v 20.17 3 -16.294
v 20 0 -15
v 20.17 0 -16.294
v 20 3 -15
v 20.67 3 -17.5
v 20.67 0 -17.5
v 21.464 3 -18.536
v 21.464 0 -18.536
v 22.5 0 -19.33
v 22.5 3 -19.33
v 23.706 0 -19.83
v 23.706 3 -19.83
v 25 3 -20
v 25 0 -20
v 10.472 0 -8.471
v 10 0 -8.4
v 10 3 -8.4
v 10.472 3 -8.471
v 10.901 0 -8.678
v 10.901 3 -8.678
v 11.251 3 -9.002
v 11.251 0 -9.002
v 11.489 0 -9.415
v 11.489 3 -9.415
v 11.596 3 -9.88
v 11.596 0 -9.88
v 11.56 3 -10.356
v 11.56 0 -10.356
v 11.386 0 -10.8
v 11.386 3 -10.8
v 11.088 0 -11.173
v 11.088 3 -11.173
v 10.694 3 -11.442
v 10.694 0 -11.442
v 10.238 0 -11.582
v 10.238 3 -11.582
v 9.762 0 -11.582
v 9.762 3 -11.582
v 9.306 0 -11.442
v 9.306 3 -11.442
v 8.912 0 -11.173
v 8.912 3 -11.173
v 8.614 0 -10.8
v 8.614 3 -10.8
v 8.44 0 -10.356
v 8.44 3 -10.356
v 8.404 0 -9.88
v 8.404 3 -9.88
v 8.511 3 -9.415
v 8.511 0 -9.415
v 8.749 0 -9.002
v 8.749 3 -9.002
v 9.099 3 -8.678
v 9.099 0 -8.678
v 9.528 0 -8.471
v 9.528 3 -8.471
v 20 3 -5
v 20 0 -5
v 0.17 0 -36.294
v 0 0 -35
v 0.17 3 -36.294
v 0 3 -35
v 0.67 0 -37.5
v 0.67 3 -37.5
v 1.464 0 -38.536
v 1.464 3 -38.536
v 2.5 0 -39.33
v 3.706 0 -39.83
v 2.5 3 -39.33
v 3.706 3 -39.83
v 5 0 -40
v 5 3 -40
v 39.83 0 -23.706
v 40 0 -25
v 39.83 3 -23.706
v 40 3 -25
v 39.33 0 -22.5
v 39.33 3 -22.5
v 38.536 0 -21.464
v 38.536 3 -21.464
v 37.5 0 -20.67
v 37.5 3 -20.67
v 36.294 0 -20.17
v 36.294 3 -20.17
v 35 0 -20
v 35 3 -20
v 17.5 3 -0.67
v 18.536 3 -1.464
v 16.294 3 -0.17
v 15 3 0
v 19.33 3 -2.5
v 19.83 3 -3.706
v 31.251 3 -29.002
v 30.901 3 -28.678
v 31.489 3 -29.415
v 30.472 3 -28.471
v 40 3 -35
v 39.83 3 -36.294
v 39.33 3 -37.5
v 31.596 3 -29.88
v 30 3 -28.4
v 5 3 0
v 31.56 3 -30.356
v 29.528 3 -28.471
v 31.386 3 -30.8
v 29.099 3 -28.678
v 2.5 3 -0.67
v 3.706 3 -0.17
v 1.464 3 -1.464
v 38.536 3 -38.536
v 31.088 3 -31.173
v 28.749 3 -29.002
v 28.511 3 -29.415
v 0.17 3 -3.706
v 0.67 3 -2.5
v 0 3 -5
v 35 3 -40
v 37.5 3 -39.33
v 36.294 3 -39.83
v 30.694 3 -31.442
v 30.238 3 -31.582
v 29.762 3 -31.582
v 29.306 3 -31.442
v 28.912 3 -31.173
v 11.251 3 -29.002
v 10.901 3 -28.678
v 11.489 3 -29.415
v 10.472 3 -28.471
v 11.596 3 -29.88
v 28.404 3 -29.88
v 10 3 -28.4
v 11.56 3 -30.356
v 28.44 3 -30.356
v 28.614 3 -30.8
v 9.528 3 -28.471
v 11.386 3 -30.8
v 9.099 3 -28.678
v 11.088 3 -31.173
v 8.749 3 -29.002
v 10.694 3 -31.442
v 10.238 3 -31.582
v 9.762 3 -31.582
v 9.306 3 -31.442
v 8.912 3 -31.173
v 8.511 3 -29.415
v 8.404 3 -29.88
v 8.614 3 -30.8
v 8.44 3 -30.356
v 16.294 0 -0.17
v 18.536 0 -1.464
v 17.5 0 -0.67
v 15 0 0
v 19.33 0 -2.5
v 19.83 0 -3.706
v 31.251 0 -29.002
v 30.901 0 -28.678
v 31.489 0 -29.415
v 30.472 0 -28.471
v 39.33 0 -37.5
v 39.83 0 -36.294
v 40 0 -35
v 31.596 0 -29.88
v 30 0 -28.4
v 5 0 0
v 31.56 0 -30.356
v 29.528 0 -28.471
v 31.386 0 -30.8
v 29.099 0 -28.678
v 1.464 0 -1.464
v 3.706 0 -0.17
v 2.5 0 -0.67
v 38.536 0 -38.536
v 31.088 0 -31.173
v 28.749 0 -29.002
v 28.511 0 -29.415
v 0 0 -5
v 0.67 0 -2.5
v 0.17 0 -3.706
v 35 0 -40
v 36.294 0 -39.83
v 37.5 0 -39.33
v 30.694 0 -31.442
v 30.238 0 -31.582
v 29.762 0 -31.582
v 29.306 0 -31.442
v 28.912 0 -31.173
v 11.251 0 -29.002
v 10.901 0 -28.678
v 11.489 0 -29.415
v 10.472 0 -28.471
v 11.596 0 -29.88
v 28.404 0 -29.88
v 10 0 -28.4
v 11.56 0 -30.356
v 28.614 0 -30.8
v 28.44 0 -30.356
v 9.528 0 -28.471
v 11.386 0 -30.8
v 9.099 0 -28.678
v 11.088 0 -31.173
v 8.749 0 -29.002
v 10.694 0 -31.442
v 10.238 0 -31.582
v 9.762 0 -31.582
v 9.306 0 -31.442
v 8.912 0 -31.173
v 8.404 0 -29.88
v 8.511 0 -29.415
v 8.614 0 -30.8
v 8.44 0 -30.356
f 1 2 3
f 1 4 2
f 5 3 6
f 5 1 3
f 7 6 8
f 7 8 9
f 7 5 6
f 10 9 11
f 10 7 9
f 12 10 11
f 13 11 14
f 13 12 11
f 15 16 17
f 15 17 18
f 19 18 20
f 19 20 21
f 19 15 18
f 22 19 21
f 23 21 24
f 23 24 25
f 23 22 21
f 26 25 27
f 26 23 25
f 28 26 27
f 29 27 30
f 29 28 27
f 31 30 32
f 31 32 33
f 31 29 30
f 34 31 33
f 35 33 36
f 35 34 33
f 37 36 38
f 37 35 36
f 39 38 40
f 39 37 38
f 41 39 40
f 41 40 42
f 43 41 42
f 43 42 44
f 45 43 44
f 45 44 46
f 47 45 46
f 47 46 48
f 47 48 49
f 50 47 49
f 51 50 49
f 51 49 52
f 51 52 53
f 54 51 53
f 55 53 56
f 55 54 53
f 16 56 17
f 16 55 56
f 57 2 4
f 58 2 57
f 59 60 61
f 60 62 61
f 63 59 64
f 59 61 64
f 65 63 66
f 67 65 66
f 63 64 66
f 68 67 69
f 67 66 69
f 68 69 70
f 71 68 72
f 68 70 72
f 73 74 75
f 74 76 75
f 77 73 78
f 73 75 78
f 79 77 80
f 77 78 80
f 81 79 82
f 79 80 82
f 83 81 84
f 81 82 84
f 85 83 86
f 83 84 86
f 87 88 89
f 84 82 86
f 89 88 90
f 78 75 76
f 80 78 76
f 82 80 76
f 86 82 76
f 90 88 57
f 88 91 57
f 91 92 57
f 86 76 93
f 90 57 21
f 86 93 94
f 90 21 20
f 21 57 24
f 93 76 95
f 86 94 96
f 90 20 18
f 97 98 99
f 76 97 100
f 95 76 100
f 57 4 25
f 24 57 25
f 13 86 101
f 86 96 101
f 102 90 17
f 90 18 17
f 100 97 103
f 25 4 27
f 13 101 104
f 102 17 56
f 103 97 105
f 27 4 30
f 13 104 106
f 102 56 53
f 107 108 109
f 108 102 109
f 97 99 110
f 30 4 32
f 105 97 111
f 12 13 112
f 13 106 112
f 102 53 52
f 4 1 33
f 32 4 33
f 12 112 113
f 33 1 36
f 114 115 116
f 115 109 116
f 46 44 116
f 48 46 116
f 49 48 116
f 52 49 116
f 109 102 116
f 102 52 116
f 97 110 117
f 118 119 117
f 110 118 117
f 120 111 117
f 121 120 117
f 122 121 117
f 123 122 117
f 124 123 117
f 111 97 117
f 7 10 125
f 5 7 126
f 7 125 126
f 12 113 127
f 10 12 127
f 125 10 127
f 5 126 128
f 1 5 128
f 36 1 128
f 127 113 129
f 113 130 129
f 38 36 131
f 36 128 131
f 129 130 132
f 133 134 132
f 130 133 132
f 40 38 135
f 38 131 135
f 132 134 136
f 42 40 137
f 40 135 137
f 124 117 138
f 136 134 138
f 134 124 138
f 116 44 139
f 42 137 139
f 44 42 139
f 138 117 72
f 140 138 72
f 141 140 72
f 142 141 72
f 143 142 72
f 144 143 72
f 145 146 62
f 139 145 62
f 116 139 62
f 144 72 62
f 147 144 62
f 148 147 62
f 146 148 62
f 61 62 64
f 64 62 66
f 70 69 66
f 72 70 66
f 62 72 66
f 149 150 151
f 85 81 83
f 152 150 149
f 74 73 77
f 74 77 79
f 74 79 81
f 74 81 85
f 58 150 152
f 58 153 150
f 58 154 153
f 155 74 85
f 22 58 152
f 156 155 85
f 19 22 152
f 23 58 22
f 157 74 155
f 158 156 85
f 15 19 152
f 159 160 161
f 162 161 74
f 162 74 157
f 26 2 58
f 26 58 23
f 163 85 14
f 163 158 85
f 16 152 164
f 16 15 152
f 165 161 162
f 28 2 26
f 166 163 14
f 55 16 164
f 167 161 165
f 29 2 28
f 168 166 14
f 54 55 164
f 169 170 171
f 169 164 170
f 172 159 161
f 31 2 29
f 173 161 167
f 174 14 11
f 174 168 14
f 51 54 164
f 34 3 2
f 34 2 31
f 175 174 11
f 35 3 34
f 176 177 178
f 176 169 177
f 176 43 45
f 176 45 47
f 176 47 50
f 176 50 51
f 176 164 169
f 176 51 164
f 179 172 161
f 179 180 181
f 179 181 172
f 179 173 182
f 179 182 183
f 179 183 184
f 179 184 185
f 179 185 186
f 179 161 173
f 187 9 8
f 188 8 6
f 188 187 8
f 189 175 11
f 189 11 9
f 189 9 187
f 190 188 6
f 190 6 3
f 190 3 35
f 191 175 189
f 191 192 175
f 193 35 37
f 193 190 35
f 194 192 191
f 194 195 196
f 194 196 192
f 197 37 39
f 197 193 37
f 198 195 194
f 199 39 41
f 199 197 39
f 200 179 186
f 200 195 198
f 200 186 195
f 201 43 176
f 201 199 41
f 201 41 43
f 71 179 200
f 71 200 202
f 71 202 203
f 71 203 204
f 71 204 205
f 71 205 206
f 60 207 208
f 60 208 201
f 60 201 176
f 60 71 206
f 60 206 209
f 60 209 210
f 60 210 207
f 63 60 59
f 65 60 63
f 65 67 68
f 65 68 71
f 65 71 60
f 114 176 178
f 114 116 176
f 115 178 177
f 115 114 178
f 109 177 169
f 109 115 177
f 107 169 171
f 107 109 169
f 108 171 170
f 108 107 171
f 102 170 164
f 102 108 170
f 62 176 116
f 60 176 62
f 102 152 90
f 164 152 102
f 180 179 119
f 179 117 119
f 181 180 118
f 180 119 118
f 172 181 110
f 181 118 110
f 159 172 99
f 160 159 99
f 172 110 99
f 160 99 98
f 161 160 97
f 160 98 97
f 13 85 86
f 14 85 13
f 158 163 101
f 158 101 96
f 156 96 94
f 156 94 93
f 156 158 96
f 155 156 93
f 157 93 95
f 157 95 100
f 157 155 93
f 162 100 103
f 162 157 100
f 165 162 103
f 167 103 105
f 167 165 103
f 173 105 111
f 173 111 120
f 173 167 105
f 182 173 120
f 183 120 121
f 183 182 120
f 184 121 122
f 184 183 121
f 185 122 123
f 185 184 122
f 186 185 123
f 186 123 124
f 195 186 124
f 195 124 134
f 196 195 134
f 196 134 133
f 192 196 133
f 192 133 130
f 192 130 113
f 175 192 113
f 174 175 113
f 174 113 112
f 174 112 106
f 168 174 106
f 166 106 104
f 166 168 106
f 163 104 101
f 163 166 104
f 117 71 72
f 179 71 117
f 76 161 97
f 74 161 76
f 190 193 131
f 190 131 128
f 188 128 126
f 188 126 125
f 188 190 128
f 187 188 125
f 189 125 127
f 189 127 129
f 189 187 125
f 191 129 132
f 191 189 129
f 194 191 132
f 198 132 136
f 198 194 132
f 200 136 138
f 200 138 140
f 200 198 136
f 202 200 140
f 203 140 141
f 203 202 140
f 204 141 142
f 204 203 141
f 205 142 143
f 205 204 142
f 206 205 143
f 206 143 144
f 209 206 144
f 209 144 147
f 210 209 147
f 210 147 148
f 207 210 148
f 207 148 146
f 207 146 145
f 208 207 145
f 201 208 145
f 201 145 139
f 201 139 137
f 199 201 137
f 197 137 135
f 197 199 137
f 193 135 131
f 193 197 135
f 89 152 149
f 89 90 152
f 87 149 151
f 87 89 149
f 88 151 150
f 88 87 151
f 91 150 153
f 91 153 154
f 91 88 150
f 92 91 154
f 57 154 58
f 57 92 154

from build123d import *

# Parameters (mm, degrees)
SKETCH_1_R      = 1.6
EXTRUDE_1_DEPTH = 3
FILLET_1_R      = 5


with BuildPart() as part:
    # 草图1 → 凸台-拉伸1 (new body)
    with BuildSketch(Plane(origin=(0, 0, 0), x_dir=(1, 0, 0), z_dir=(0, 1, 0))):
        Polygon((0, 0), (0, 40), (40, 40), (40, 20), (20, 20), (20, 0), align=None)
        with Locations(Location((30, 30, 0), (0, 0, 270))):
            Circle(SKETCH_1_R, mode=Mode.SUBTRACT)
        with Locations(Location((10, 30, 0), (0, 0, 270))):
            Circle(SKETCH_1_R, mode=Mode.SUBTRACT)
        with Locations(Location((10, 10, 0), (0, 0, 270))):
            Circle(SKETCH_1_R, mode=Mode.SUBTRACT)
    extrude(amount=EXTRUDE_1_DEPTH)

    # 圆角1
    fillet_1_edges = [part.edges().sort_by_distance(p)[0] for p in [
        (0, 1.5, 0),
        (0, 1.5, -40),
        (40, 1.5, -40),
        (40, 1.5, -20),
        (20, 1.5, -20),
        (20, 1.5, 0),
    ]]
    fillet(fillet_1_edges, radius=FILLET_1_R)


solid = part.part
